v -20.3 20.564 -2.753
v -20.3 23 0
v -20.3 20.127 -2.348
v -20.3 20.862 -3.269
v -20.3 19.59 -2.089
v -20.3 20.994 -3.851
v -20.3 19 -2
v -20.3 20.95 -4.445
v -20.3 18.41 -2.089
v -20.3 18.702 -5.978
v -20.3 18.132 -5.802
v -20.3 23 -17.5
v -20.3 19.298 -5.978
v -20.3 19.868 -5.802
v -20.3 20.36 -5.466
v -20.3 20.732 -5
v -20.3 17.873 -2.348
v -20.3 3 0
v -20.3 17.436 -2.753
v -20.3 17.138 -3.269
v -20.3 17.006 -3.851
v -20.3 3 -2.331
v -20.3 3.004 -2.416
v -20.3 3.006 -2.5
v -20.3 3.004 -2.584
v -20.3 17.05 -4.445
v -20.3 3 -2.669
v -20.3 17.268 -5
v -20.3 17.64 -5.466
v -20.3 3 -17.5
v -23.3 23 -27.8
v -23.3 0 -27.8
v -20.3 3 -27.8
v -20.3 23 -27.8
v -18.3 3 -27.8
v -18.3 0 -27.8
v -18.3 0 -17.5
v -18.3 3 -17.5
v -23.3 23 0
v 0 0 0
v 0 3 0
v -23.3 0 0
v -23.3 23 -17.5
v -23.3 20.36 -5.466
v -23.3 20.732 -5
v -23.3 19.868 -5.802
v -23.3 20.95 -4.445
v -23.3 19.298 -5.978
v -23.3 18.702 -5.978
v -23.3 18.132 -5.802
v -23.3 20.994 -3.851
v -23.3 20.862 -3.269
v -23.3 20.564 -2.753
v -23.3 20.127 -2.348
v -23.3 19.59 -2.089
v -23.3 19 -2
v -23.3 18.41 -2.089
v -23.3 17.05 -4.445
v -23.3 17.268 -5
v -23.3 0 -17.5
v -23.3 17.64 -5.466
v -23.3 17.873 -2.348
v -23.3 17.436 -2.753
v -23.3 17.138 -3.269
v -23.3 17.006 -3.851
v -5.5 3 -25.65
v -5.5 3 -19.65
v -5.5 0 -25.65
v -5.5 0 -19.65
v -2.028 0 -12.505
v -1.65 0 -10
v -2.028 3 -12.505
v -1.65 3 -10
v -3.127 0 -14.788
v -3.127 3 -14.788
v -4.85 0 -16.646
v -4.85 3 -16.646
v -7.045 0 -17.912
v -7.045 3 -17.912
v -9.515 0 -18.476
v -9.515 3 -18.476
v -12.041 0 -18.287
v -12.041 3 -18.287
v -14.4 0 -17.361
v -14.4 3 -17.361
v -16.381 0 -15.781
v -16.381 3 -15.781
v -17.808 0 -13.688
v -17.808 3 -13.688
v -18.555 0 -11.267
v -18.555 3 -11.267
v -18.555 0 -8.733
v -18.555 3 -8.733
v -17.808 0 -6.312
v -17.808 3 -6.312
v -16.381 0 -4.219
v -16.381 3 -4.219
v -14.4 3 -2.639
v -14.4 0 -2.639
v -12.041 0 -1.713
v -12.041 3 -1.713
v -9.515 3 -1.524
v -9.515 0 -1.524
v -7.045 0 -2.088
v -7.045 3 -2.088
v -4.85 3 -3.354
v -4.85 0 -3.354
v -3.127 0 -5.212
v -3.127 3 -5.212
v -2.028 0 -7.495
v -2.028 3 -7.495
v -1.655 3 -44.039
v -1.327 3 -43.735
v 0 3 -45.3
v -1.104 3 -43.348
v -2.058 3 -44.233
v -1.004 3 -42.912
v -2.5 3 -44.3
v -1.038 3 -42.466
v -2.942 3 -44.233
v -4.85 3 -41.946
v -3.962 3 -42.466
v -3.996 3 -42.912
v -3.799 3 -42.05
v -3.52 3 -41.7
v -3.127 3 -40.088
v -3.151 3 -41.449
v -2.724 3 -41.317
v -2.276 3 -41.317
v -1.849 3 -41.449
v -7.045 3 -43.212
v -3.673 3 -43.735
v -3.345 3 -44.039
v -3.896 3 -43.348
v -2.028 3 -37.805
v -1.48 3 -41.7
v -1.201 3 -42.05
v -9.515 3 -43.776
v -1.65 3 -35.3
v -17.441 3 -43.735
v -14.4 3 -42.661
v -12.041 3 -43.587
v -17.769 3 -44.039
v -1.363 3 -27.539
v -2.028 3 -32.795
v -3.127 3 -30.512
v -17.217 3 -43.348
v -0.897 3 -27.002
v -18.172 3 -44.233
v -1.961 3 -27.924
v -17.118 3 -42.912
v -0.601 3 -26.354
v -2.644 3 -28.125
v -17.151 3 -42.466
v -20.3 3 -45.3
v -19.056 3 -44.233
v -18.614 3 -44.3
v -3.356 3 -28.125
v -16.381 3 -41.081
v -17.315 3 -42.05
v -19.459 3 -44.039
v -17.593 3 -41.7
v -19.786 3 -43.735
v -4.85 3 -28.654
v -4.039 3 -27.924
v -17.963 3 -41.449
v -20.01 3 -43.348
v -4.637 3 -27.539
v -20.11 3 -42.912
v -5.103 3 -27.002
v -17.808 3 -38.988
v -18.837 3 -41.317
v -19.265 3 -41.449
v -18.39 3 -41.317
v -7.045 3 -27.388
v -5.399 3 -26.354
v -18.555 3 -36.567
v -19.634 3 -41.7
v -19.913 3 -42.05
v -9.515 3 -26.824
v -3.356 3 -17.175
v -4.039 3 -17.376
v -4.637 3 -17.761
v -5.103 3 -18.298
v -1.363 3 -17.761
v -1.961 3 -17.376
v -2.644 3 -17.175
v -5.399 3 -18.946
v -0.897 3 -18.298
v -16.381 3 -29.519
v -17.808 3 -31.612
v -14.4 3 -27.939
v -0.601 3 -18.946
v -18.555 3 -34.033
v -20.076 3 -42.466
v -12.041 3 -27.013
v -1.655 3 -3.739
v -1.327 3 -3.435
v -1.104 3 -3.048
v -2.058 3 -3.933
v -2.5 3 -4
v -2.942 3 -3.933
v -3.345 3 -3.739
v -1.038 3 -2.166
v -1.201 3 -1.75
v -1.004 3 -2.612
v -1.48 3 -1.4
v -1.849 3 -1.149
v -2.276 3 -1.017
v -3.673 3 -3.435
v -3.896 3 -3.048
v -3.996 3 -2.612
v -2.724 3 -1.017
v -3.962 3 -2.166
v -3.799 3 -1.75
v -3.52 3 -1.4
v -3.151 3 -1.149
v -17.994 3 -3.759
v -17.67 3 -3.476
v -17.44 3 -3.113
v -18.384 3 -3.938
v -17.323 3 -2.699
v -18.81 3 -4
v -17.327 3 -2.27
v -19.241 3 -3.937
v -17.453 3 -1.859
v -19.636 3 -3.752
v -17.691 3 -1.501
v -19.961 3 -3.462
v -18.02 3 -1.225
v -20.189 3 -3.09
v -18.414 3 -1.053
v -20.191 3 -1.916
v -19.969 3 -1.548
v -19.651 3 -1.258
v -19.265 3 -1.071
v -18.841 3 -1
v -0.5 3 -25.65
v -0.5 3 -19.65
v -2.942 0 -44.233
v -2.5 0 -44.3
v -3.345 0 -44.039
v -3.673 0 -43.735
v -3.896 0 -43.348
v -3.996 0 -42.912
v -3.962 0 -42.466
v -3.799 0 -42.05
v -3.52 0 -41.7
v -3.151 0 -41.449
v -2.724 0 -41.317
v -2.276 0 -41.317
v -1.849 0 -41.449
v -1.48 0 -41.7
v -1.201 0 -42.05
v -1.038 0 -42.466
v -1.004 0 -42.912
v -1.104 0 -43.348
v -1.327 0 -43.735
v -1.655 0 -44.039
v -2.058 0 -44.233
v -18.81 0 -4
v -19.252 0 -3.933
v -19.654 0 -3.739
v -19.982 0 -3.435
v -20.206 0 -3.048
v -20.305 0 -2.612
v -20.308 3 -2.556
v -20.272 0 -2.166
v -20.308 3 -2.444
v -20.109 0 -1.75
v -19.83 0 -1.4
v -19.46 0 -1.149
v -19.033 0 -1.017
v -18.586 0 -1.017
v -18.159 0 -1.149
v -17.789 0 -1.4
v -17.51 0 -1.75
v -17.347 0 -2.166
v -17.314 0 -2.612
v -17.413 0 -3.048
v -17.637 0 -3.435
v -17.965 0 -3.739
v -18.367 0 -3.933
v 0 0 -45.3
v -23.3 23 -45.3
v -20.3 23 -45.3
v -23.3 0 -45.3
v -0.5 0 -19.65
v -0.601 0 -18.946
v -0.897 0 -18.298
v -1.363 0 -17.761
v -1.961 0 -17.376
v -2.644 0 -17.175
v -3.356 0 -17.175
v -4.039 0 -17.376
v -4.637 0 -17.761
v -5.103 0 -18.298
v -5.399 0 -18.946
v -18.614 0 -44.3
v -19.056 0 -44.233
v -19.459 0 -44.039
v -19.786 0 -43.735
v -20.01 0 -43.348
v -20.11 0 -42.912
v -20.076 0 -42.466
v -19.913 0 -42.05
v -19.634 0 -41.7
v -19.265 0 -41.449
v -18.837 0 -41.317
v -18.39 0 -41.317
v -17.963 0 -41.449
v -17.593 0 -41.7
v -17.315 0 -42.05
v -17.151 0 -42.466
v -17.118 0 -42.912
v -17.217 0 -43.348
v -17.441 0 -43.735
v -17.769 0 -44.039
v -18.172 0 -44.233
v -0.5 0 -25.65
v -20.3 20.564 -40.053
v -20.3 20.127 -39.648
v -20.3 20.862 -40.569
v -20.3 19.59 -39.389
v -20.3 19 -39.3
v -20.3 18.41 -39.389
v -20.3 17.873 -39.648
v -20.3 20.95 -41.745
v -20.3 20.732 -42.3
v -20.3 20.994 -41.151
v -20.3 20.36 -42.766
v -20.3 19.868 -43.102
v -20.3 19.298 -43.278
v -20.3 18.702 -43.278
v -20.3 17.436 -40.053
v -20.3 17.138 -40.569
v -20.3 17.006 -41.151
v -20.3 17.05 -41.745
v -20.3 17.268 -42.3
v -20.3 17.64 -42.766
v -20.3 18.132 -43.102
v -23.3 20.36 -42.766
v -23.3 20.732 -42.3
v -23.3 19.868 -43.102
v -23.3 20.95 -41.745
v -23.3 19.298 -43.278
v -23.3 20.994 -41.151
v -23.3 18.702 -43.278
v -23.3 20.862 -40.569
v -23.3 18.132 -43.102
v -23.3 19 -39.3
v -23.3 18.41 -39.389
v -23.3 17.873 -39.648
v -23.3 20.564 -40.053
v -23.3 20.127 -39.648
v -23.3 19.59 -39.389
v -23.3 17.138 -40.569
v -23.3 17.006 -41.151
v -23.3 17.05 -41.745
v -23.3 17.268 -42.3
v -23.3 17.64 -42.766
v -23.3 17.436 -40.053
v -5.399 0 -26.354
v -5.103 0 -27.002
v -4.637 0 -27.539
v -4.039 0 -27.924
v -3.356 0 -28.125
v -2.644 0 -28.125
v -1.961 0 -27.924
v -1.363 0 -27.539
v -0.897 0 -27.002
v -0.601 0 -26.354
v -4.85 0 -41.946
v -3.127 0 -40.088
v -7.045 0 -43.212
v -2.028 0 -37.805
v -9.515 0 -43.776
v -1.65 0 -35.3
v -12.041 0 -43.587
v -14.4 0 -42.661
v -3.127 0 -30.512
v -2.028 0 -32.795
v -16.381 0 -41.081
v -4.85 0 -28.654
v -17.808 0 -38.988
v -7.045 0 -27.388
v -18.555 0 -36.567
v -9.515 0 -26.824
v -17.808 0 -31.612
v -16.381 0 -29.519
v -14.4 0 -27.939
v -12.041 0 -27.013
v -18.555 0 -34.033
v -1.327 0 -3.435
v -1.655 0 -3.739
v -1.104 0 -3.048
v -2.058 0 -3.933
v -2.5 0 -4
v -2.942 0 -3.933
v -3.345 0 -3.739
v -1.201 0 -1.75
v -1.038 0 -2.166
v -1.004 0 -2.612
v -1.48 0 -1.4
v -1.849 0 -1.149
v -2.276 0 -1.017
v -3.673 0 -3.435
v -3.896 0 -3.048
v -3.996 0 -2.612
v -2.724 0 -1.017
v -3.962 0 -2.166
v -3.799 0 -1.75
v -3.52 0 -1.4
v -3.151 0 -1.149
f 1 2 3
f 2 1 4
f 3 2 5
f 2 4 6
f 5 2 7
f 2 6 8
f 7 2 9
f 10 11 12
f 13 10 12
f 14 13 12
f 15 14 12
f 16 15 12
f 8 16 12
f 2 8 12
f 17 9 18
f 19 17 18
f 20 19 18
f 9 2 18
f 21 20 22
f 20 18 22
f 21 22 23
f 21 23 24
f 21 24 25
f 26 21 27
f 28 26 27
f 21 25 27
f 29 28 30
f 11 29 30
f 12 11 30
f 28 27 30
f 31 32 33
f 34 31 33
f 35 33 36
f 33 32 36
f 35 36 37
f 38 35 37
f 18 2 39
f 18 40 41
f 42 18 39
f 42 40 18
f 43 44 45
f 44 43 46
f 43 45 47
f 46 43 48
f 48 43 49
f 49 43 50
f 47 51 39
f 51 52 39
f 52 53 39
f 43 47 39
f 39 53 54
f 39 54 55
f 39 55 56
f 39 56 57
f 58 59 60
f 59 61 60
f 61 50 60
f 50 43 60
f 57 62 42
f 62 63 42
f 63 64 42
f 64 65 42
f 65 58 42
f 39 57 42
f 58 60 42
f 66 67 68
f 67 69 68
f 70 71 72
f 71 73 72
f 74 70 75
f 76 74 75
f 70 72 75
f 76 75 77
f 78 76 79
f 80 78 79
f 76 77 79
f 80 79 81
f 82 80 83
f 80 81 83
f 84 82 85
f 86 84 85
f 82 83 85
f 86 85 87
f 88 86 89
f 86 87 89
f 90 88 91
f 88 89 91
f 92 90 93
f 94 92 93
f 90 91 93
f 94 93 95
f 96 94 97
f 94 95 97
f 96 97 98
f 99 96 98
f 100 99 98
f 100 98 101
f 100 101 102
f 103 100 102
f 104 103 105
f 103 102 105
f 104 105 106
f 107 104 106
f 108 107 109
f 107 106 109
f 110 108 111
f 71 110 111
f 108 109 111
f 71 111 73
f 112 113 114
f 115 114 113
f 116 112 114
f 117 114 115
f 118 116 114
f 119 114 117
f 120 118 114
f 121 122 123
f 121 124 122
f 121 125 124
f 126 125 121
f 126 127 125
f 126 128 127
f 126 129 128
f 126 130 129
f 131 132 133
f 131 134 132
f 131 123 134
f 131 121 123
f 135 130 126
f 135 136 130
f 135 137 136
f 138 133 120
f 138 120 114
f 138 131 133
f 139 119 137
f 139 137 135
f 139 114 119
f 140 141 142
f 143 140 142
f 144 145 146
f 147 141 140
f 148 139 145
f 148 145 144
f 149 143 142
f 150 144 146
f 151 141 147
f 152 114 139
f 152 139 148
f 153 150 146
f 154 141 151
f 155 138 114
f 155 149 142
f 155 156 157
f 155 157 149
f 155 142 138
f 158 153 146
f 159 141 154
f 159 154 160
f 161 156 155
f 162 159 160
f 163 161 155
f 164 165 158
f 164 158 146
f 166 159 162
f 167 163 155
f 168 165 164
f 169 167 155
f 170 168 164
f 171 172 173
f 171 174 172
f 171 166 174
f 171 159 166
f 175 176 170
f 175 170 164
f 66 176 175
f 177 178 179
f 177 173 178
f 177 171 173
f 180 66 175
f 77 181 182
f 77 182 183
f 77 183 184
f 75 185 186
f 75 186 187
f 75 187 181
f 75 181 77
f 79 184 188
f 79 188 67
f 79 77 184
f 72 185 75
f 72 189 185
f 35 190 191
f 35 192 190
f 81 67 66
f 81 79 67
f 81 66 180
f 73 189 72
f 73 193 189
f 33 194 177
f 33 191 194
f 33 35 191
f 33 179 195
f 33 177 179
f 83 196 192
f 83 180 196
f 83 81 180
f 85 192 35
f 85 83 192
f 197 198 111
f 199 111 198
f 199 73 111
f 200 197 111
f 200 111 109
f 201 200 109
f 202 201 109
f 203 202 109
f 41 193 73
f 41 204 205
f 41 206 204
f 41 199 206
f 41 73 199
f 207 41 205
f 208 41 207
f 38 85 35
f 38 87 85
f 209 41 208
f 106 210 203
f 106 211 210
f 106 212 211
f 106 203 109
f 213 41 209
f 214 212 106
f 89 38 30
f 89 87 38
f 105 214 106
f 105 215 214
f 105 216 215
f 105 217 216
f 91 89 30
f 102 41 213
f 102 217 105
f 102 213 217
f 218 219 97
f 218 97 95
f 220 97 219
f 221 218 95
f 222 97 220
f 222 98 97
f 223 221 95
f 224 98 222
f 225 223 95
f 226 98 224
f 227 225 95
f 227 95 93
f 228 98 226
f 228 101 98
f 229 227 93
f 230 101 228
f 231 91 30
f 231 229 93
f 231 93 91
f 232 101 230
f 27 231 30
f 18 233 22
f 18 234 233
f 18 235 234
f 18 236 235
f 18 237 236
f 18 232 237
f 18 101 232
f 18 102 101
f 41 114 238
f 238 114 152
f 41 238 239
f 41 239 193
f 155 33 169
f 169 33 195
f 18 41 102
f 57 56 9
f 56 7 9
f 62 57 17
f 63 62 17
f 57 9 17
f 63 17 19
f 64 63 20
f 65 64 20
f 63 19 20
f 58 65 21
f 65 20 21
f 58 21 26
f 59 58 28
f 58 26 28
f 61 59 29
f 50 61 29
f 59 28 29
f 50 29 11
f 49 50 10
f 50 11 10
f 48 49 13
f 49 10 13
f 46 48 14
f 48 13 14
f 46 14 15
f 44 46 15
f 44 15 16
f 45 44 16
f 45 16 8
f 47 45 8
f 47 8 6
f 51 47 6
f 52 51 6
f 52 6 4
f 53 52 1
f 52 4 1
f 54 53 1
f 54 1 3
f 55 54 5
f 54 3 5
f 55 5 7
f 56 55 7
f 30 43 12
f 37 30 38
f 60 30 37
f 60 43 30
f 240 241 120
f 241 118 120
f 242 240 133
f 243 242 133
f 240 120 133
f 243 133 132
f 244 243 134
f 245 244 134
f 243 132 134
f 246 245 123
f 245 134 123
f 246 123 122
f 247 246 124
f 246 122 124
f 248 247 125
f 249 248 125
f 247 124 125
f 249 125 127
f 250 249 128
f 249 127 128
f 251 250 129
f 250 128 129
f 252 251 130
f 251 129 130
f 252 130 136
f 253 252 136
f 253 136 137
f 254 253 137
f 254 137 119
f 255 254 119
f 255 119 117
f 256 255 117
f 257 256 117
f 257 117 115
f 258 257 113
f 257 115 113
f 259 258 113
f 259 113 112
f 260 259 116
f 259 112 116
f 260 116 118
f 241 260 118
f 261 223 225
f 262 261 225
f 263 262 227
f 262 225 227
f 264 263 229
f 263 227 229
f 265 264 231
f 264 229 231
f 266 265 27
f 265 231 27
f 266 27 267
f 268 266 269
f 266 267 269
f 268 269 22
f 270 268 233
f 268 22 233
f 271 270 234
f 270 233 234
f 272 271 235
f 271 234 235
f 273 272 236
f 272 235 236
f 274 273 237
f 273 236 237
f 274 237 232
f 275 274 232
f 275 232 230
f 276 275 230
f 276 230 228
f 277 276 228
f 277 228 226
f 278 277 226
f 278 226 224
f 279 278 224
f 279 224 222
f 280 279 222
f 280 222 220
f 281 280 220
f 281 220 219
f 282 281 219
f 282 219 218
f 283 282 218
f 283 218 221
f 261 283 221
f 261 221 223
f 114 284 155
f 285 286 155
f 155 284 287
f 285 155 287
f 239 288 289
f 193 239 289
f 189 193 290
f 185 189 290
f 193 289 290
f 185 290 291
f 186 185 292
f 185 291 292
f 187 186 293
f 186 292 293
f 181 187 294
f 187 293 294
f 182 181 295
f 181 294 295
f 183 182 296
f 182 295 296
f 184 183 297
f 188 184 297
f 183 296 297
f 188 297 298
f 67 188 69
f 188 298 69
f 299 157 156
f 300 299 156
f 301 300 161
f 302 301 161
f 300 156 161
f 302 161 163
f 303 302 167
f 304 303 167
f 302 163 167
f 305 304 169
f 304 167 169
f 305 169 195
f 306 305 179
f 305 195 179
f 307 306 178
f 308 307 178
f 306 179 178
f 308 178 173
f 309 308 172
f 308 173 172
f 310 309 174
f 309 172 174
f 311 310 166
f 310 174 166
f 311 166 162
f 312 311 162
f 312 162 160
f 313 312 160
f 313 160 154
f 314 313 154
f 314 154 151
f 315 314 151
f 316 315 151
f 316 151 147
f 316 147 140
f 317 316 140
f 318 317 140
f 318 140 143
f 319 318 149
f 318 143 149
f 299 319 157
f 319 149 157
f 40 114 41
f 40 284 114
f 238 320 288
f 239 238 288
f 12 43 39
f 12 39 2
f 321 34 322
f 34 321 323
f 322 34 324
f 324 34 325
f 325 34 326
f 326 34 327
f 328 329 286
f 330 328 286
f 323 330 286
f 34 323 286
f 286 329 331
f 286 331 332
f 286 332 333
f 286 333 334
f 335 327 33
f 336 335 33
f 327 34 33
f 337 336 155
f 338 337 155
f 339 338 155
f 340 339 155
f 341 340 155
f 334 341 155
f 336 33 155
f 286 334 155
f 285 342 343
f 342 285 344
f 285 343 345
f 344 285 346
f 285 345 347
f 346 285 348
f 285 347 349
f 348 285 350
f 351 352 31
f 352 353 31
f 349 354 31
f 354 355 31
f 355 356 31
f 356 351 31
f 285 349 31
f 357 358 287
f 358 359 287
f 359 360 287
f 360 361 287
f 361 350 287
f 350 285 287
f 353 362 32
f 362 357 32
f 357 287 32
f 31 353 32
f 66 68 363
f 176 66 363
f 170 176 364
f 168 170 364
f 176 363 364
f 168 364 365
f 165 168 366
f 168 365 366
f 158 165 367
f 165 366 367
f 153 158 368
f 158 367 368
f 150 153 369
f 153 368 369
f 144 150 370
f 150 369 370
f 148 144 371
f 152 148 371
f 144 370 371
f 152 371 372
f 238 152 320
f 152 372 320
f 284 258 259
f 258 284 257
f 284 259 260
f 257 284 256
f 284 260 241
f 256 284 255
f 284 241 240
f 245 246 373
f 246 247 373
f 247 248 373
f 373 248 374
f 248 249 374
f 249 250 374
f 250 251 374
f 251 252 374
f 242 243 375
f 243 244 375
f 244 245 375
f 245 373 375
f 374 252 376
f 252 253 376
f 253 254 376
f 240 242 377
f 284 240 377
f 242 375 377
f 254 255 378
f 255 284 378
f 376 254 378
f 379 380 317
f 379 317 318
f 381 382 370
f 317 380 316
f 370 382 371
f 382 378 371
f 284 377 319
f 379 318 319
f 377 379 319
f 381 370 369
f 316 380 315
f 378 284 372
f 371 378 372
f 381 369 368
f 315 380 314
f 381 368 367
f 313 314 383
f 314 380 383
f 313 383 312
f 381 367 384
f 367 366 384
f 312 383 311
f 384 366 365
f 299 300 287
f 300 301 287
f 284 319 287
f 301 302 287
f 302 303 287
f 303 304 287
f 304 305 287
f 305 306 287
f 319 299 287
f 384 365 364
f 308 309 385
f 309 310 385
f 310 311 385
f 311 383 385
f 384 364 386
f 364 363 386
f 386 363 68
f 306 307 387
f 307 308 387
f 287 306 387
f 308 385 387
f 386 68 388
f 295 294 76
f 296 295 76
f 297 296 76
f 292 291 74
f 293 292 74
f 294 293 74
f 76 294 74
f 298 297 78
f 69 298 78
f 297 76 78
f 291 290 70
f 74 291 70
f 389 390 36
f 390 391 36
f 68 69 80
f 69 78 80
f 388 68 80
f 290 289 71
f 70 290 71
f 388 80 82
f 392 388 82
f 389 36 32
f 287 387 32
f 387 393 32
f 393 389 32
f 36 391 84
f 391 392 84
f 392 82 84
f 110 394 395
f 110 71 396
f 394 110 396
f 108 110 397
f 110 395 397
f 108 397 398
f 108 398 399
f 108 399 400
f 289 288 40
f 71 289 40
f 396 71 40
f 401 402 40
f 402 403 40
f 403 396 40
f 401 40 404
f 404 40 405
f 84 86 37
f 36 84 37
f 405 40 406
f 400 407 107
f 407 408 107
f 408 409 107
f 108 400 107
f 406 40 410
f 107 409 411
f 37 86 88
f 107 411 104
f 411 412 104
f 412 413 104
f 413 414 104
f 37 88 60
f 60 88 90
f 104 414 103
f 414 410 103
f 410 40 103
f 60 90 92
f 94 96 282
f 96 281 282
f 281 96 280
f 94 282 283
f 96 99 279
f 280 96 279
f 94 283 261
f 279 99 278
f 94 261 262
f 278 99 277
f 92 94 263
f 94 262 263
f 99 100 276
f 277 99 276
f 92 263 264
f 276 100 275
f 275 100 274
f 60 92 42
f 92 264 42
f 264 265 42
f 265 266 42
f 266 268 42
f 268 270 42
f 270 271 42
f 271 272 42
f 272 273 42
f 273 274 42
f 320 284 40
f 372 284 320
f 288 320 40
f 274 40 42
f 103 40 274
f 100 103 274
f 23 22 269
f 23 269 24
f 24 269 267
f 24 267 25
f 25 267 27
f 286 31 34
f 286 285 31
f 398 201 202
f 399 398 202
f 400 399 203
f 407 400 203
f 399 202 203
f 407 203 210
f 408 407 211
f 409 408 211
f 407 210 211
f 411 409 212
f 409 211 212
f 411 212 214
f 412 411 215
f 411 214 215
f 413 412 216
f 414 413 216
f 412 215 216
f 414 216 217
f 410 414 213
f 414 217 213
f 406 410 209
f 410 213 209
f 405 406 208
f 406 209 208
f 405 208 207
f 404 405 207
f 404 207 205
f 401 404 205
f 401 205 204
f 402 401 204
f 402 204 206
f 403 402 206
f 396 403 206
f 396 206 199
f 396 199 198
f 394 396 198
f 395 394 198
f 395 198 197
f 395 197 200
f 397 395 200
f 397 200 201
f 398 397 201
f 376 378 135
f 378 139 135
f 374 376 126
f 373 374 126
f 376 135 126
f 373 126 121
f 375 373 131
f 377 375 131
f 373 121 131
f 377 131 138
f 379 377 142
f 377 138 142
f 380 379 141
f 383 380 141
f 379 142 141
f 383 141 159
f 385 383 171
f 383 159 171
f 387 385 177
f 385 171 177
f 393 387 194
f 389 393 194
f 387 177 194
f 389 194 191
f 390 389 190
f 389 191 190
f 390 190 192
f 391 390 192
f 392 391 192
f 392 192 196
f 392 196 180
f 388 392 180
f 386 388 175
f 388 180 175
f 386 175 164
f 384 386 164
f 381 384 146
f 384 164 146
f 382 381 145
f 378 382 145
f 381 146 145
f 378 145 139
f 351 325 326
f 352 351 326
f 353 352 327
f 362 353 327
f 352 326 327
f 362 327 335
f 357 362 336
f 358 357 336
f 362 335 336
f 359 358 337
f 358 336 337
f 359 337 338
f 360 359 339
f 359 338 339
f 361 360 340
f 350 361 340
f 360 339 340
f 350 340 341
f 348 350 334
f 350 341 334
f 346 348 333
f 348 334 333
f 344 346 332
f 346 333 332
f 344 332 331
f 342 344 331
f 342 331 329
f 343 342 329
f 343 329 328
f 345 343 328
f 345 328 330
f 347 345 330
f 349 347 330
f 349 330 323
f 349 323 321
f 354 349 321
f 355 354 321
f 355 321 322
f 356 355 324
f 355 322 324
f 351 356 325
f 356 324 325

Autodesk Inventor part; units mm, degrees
ref_plane "YZ Plane" through (0, 0, 0) normal (1, 0, 0) x (0, 1, 0)
ref_plane "XZ Plane" through (0, 0, 0) normal (0, 1, 0) x (-1, 0, 0)
ref_plane "XY Plane" through (0, 0, 0) normal (0, 0, 1) x (1, 0, 0)
sketch "Sketch1" plane through (0, 0, 0) normal (0, 1, 0) x (-1, 0, 0)
  line L0 (0, 0) -> (20.3, 0)
  line L1 (20.3, 0) -> (20.3, -45.3)
  line L2 (20.3, -45.3) -> (0, -45.3)
  line L3 (0, -45.3) -> (0, 0)
  dimension "d0" = 20.3
  dimension "d1" = 45.3
extrude "Extrusion1" add sketch "Sketch1" along normal blind 3
sketch "Sketch2" plane through (0, 3, 0) normal (0, 1, 0) x (1, 0, 0)
  circle A0 centre (-10.15, 10) radius 8.5
  line L0 (-20.3, 45.3) -> (-20.3, 0) projected
  line L1 (0, 0) -> (0, 45.3) projected
  line L2 (-20.3, 0) -> (0, 0) projected
  circle A1 centre (-10.15, 35.3) radius 8.5
  line L3 (0, 45.3) -> (-20.3, 45.3) projected
  dimension "d4" = 17
  dimension "d5" = 10.15
  dimension "d6" = 10.15
  dimension "d7" = 10
  dimension "d8" = 17
  dimension "d9" = 10.15
  dimension "d10" = 10
extrude "Extrusion2" cut sketch "Sketch2" against normal blind 3 contours A0 | A1
sketch "Sketch3" plane through (-20.3, 0, -45.3) normal (-1, 0, 0) x (0, 0, 1)
  line L0 (45.3, 3) -> (0, 3) projected
  line L1 (45.3, 0) -> (27.8, 0)
  line L2 (27.8, 0) -> (27.8, 3)
  line L3 (27.8, 3) -> (45.3, 3)
  line L4 (45.3, 3) -> (45.3, 0)
  line L5 (0, 0) -> (17.5, 0)
  line L6 (17.5, 0) -> (17.5, 3)
  line L7 (17.5, 3) -> (0, 3)
  line L8 (0, 3) -> (0, 0)
  point P0 (0, 3)
  dimension "d13" = 17.5
  dimension "d14" = 17.5
extrude "Extrusion3" add sketch "Sketch3" along normal blind 3
sketch "Sketch4" plane through (0, 3, 0) normal (0, 1, 0) x (1, 0, 0)
  line L0 (0, 0) -> (-23.3, 0) projected
  line L1 (0, 45.3) -> (-23.3, 45.3) projected
  line L2 (-23.3, 0) -> (-20.3, 0)
  line L3 (-20.3, 0) -> (-20.3, 45.3)
  line L4 (-20.3, 45.3) -> (-23.3, 45.3)
  line L5 (-23.3, 45.3) -> (-23.3, 0)
  dimension "d17" = 3
extrude "Extrusion4" add sketch "Sketch4" along normal blind 20
sketch "Sketch5" plane through (-23.3, 0, -45.3) normal (-1, 0, 0) x (0, 0, 1)
  line L0 (27.8, 0) -> (27.8, 3) projected
  line L1 (27.8, 3) -> (17.5, 3)
  line L2 (17.5, 3) -> (17.5, 23)
  line L3 (17.5, 23) -> (27.8, 23)
  line L4 (27.8, 23) -> (27.8, 3)
  line L5 (17.5, 0) -> (17.5, 3) projected
  point P0 (45.3, 0)
  dimension "d20" = 10.3
  dimension "d21" = 0
  dimension "d22" = 20
extrude "Extrusion5" cut sketch "Sketch5" against normal blind 3
sketch "Sketch6" plane through (0, 0, 0) normal (0, -1, 0) x (1, 0, 0)
  line L0 (-3, -28.15) -> (-3, -17.15) construction
  line L1 (-0.5, -25.65) -> (-0.5, -19.65)
  line L2 (-5.5, -19.65) -> (-5.5, -25.65)
  arc A0 (-5.5, -25.65) -> (-0.5, -25.65) centre (-3, -25.65) ccw
  arc A1 (-0.5, -19.65) -> (-5.5, -19.65) centre (-3, -19.65) ccw
  line L3 (0, 0) -> (0, -45.3) projected
  line L4 (0, -45.3) -> (-23.3, -45.3) projected
  point P0 (-3, -22.65)
  dimension "d25" = 11
  dimension "d26" = 5
  dimension "d27" = 0.5
  dimension "d28" = 22.65
extrude "Extrusion6" cut sketch "Sketch6" against normal blind 3
sketch "Sketch7" plane through (0, 0, 0) normal (0, -1, 0) x (1, 0, 0)
  line L0 (-20.3, -27.8) -> (-20.3, -17.5) projected
  line L1 (-20.3, -27.8) -> (-18.3, -27.8)
  line L2 (-18.3, -27.8) -> (-18.3, -17.5)
  line L3 (-18.3, -17.5) -> (-20.3, -17.5)
  line L4 (-20.3, -17.5) -> (-20.3, -27.8)
  point P0 (0, 0)
  dimension "d31" = 2
extrude "Extrusion7" cut sketch "Sketch7" against normal blind 3
sketch "Sketch8" plane through (0, 0, 0) normal (0, -1, 0) x (1, 0, 0)
  line L0 (0, 0) -> (0, -45.3) projected
  line L1 (0, -45.3) -> (-23.3, -45.3) projected
  line L2 (0, 0) -> (-23.3, 0) projected
  point P0 (-2.5, -2.5)
  point P1 (-18.8095, -2.5)
  point P2 (-18.6137, -42.8)
  point P3 (-2.5, -42.8)
  dimension "d52" = 2.5
  dimension "d53" = 2.5
  dimension "d54" = 2.5
  dimension "d55" = 2.5
  dimension "d56" = 2.5
  dimension "d57" = 2.5
hole "Hole1" at (-2.5, 0, -42.8) at (-2.5, 0, -2.5) at (-18.8095, 0, -2.5) at (-18.6137, 0, -42.8) direction (0, 1, 0) diameter 3 depth 3 tip angle 118
sketch "Sketch9" plane through (-23.3, 0, -45.3) normal (-1, 0, 0) x (0, 0, 1)
  line L0 (0, 23) -> (45.3, 23) projected
  line L1 (0, 0) -> (0, 23) projected
  line L2 (45.3, 0) -> (45.3, 23) projected
  point P0 (4, 19)
  point P1 (41.3, 19)
  dimension "d41" = 4
  dimension "d49" = 4
  dimension "d50" = 4
  dimension "d51" = 4
hole "Hole2" at (-23.3, 19, -41.3) at (-23.3, 19, -4) direction (1, 0, 0) diameter 4 depth 3 tip angle 118
properties part number "USSensorBracket"
